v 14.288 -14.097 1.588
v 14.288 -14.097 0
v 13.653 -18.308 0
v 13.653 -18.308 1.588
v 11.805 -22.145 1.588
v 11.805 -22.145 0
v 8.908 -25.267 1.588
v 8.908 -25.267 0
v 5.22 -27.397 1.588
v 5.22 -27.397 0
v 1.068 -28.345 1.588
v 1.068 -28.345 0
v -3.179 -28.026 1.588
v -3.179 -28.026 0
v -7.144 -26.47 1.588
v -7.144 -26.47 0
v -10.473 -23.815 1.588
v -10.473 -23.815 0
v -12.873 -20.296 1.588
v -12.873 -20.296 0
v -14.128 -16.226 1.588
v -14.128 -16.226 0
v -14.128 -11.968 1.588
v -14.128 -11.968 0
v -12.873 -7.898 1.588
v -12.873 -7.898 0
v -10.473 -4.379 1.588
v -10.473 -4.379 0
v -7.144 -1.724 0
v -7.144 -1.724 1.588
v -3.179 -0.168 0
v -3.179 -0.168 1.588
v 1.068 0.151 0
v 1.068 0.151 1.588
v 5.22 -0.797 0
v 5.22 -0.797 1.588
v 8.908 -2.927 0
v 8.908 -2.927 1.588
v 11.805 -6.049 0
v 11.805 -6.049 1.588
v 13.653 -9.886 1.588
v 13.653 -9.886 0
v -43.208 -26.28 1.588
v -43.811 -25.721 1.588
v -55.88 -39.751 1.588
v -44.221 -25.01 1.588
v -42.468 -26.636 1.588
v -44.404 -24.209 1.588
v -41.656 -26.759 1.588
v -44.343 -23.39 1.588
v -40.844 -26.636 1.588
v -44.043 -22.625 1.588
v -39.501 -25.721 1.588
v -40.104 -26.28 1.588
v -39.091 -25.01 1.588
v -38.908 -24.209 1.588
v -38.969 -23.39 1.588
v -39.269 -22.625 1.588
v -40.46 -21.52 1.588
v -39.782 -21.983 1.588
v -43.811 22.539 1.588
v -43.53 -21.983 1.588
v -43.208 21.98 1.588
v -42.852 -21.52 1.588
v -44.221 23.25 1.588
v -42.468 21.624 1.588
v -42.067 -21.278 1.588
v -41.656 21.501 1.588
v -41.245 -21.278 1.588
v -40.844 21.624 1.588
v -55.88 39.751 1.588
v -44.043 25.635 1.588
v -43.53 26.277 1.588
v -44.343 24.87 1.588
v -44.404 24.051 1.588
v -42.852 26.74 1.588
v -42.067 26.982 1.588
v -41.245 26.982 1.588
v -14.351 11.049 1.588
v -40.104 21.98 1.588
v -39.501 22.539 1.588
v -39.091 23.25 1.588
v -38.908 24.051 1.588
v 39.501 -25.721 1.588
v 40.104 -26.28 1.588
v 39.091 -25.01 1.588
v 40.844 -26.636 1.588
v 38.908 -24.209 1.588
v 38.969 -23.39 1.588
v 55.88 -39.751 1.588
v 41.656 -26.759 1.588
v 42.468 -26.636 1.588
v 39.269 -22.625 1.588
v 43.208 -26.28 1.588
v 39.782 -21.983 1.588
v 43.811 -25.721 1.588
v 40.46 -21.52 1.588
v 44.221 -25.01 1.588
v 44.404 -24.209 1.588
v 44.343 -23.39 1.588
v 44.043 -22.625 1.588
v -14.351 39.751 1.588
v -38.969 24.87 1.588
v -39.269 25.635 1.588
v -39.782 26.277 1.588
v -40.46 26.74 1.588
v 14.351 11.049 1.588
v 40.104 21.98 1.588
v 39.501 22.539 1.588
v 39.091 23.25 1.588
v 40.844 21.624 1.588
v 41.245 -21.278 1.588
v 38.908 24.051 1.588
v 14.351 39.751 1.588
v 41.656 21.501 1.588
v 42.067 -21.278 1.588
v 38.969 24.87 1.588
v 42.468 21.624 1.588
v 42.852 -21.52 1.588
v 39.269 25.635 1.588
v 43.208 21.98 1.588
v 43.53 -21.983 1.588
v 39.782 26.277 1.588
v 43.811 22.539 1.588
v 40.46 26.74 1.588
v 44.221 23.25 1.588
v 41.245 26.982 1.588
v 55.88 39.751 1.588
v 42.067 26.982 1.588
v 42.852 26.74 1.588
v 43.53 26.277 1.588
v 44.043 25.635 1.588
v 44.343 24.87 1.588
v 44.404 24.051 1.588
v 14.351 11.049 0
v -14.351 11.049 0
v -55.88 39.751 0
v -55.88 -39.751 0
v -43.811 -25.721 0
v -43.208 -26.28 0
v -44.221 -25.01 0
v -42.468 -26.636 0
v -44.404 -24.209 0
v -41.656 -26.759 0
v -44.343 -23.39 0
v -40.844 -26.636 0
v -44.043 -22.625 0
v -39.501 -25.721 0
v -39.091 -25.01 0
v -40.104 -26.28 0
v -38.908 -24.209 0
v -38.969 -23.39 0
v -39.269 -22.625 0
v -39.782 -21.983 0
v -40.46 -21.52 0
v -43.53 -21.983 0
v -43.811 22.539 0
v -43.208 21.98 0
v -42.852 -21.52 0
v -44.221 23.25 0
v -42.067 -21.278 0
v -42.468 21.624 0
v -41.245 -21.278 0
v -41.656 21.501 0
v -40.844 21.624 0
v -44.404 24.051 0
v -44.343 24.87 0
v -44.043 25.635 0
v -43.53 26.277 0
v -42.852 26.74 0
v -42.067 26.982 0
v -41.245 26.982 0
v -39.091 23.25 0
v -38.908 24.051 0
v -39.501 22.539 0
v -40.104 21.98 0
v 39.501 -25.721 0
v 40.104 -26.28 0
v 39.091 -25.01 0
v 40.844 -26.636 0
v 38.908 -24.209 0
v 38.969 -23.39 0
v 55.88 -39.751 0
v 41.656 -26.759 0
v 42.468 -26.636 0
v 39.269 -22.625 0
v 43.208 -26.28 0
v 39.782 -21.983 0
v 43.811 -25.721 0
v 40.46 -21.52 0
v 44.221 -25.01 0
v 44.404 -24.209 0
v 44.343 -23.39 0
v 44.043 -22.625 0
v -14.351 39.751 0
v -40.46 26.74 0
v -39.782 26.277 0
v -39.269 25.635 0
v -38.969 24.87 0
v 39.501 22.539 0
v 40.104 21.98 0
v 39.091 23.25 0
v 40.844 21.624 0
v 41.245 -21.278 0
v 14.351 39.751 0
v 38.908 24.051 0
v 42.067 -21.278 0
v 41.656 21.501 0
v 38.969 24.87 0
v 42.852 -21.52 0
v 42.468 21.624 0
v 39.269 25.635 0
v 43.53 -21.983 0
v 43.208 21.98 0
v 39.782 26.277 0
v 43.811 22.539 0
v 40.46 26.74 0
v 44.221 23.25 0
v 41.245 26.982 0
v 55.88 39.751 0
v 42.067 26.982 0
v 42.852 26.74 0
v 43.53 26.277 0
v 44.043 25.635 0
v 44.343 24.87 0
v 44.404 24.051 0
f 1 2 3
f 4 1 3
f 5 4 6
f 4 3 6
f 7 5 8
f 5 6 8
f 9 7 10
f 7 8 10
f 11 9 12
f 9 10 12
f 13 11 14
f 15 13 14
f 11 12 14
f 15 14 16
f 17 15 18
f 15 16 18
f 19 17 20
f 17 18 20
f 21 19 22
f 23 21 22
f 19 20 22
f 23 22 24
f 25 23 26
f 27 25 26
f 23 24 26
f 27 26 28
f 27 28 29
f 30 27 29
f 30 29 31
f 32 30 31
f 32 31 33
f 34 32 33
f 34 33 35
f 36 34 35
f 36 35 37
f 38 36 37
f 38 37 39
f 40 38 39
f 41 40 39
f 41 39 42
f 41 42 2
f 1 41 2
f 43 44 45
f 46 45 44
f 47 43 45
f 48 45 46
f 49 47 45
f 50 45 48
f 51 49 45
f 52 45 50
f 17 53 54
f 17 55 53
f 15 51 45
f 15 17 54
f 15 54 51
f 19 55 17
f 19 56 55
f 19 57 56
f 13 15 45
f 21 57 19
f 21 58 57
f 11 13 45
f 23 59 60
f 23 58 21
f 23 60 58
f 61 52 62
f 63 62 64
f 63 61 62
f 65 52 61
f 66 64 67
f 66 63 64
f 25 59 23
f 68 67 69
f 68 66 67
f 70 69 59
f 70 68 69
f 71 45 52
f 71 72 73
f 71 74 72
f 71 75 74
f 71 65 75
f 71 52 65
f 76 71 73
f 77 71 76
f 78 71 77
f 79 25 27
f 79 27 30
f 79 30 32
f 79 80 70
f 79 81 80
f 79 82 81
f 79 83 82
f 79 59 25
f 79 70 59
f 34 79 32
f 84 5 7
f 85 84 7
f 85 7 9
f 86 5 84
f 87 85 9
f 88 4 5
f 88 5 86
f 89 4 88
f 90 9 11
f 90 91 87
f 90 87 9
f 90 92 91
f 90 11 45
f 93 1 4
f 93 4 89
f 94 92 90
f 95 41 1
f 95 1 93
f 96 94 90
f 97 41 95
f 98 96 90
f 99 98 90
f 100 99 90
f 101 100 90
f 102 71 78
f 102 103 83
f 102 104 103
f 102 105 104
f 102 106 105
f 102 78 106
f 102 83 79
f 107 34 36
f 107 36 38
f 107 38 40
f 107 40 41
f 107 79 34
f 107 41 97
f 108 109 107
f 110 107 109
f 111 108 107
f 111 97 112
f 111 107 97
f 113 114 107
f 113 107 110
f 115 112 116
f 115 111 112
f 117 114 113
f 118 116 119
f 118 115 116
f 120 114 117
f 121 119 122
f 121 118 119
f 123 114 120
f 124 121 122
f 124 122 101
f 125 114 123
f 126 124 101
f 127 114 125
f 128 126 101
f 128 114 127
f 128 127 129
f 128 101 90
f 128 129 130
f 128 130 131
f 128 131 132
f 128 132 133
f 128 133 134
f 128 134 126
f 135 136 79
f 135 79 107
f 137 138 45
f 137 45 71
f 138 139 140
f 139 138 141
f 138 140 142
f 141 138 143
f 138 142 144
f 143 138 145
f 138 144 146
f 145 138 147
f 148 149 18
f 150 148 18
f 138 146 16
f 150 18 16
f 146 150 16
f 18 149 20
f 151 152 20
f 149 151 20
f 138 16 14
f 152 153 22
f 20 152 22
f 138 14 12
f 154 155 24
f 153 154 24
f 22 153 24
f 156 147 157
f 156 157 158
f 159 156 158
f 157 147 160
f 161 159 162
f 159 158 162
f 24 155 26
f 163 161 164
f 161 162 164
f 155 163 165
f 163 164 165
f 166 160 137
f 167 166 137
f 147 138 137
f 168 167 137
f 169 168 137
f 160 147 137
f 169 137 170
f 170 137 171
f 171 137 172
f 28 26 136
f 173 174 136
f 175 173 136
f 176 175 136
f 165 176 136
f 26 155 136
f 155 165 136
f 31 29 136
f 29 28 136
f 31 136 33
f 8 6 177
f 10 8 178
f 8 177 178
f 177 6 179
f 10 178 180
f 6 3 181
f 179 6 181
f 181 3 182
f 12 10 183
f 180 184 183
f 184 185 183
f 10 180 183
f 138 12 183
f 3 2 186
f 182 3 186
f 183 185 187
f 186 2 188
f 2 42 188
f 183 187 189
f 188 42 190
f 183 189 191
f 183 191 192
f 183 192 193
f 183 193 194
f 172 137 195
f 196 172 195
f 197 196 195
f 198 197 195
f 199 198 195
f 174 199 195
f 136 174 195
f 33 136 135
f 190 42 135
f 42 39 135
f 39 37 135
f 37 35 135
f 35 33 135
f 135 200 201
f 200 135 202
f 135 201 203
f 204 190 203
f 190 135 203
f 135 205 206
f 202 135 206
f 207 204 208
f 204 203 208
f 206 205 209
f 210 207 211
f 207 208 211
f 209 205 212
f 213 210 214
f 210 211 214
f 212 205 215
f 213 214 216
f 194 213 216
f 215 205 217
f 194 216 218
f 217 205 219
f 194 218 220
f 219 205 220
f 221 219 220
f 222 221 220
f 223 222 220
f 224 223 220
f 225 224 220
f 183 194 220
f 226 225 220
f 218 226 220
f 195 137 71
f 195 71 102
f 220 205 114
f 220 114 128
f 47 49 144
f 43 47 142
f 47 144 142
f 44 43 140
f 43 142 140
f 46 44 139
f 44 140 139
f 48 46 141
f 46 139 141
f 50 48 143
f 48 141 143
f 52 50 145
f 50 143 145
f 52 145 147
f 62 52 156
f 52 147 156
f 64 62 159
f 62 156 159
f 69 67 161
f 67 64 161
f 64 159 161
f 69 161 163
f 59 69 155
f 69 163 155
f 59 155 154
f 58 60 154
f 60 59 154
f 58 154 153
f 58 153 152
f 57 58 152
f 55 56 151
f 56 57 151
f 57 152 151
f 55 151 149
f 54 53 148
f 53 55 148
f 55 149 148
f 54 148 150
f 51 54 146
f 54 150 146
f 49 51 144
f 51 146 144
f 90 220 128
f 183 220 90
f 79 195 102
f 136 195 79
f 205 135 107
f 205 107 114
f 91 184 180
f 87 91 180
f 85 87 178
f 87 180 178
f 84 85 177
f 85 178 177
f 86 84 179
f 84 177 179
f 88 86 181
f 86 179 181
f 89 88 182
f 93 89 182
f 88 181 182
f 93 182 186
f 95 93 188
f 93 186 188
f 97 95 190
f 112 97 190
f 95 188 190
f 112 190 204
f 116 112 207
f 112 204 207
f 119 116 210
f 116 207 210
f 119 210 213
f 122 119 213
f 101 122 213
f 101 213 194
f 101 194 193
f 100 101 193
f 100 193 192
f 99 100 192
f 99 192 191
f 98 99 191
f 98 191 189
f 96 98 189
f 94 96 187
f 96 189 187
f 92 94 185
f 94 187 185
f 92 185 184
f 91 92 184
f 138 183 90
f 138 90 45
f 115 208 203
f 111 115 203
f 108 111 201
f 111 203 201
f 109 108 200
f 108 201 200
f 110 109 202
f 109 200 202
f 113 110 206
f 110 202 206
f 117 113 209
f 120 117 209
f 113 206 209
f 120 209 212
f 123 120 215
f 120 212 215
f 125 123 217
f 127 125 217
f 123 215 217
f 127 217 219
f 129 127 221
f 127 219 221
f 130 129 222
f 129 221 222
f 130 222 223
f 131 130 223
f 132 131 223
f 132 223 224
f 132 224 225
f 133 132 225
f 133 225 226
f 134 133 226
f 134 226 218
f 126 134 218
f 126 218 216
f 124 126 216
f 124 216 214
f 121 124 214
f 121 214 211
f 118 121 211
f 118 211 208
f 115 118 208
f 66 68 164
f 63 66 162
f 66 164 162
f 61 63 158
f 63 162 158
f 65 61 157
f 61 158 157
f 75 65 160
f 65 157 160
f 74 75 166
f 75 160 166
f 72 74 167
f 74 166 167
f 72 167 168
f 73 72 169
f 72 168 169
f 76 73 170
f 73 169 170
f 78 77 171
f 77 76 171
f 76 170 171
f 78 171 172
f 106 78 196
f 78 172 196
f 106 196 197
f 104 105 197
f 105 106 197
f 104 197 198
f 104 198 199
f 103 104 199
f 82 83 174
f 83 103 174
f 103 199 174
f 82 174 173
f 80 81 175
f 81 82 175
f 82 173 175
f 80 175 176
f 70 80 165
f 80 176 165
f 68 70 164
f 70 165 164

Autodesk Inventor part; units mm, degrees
ref_plane "YZ Plane" through (0, 0, 0) normal (1, 0, 0) x (0, 1, 0)
ref_plane "XZ Plane" through (0, 0, 0) normal (0, 1, 0) x (-1, 0, 0)
ref_plane "XY Plane" through (0, 0, 0) normal (0, 0, 1) x (1, 0, 0)
sketch "Sketch1" plane through (0, 0, 0) normal (0, 0, 1) x (1, 0, 0)
  line L0 (0, -55.6514) -> (0, 55.6514) projected
  line L1 (55.88, 39.751) -> (55.88, -39.751)
  line L2 (55.88, -39.751) -> (-55.88, -39.751)
  line L3 (-55.88, -39.751) -> (-55.88, 39.751)
  line L4 (-78.232, 0) -> (78.232, 0) projected
  line L5 (-14.351, 39.751) -> (-14.351, 11.049)
  line L6 (-14.351, 11.049) -> (14.351, 11.049)
  line L7 (14.351, 11.049) -> (14.351, 39.751)
  line L8 (-55.88, 39.751) -> (-14.351, 39.751)
  line L9 (14.351, 39.751) -> (55.88, 39.751)
  line L10 (0, -39.751) -> (0, -14.097)
  circle A0 centre (0, -14.097) radius 14.2875
  point P0 (0, 0)
  dimension "d0" = 111.76
  dimension "d1" = 79.502
  dimension "d2" = 28.702
  dimension "d3" = 28.702
  dimension "d4" = 25.654
  dimension "d5" = 28.575
extrude "Extrusion1" add sketch "Sketch1" along normal blind 1.5875 contours L2 L3 L4 A0 L0 | L0 A0 L4 L1 L2 | L4 L3 L8 L5 L6 L0 A0 | L4 A0 L0 L6 L7 L9 L1
sketch "Sketch2" plane through (0, 0, 1.5875) normal (0, 0, 1) x (1, 0, 0)
  line L0 (55.88, -39.751) -> (55.88, 39.751) projected
  line L1 (-55.88, -39.751) -> (55.88, -39.751) projected
  point P0 (0, 0)
  point P1 (41.656, 24.257)
  point P2 (41.656, -24.003)
  dimension "d15" = 48.26
  dimension "d16" = 14.224
  dimension "d17" = 14.224
  dimension "d18" = 15.748
hole "Hole1" at (41.656, 24.257, 1.5875) at (41.656, -24.003, 1.5875) direction (0, 0, -1) diameter 5.5118 end through all clearance for "Flat Head Machine Screw" size "M5" standard "Ansi Metric M Profile"
mirror "Mirror1" about plane through (0, 0, 0) normal (1, 0, 0) of "Hole1"
properties part number "DIFF_PLATE_ROD_H"
